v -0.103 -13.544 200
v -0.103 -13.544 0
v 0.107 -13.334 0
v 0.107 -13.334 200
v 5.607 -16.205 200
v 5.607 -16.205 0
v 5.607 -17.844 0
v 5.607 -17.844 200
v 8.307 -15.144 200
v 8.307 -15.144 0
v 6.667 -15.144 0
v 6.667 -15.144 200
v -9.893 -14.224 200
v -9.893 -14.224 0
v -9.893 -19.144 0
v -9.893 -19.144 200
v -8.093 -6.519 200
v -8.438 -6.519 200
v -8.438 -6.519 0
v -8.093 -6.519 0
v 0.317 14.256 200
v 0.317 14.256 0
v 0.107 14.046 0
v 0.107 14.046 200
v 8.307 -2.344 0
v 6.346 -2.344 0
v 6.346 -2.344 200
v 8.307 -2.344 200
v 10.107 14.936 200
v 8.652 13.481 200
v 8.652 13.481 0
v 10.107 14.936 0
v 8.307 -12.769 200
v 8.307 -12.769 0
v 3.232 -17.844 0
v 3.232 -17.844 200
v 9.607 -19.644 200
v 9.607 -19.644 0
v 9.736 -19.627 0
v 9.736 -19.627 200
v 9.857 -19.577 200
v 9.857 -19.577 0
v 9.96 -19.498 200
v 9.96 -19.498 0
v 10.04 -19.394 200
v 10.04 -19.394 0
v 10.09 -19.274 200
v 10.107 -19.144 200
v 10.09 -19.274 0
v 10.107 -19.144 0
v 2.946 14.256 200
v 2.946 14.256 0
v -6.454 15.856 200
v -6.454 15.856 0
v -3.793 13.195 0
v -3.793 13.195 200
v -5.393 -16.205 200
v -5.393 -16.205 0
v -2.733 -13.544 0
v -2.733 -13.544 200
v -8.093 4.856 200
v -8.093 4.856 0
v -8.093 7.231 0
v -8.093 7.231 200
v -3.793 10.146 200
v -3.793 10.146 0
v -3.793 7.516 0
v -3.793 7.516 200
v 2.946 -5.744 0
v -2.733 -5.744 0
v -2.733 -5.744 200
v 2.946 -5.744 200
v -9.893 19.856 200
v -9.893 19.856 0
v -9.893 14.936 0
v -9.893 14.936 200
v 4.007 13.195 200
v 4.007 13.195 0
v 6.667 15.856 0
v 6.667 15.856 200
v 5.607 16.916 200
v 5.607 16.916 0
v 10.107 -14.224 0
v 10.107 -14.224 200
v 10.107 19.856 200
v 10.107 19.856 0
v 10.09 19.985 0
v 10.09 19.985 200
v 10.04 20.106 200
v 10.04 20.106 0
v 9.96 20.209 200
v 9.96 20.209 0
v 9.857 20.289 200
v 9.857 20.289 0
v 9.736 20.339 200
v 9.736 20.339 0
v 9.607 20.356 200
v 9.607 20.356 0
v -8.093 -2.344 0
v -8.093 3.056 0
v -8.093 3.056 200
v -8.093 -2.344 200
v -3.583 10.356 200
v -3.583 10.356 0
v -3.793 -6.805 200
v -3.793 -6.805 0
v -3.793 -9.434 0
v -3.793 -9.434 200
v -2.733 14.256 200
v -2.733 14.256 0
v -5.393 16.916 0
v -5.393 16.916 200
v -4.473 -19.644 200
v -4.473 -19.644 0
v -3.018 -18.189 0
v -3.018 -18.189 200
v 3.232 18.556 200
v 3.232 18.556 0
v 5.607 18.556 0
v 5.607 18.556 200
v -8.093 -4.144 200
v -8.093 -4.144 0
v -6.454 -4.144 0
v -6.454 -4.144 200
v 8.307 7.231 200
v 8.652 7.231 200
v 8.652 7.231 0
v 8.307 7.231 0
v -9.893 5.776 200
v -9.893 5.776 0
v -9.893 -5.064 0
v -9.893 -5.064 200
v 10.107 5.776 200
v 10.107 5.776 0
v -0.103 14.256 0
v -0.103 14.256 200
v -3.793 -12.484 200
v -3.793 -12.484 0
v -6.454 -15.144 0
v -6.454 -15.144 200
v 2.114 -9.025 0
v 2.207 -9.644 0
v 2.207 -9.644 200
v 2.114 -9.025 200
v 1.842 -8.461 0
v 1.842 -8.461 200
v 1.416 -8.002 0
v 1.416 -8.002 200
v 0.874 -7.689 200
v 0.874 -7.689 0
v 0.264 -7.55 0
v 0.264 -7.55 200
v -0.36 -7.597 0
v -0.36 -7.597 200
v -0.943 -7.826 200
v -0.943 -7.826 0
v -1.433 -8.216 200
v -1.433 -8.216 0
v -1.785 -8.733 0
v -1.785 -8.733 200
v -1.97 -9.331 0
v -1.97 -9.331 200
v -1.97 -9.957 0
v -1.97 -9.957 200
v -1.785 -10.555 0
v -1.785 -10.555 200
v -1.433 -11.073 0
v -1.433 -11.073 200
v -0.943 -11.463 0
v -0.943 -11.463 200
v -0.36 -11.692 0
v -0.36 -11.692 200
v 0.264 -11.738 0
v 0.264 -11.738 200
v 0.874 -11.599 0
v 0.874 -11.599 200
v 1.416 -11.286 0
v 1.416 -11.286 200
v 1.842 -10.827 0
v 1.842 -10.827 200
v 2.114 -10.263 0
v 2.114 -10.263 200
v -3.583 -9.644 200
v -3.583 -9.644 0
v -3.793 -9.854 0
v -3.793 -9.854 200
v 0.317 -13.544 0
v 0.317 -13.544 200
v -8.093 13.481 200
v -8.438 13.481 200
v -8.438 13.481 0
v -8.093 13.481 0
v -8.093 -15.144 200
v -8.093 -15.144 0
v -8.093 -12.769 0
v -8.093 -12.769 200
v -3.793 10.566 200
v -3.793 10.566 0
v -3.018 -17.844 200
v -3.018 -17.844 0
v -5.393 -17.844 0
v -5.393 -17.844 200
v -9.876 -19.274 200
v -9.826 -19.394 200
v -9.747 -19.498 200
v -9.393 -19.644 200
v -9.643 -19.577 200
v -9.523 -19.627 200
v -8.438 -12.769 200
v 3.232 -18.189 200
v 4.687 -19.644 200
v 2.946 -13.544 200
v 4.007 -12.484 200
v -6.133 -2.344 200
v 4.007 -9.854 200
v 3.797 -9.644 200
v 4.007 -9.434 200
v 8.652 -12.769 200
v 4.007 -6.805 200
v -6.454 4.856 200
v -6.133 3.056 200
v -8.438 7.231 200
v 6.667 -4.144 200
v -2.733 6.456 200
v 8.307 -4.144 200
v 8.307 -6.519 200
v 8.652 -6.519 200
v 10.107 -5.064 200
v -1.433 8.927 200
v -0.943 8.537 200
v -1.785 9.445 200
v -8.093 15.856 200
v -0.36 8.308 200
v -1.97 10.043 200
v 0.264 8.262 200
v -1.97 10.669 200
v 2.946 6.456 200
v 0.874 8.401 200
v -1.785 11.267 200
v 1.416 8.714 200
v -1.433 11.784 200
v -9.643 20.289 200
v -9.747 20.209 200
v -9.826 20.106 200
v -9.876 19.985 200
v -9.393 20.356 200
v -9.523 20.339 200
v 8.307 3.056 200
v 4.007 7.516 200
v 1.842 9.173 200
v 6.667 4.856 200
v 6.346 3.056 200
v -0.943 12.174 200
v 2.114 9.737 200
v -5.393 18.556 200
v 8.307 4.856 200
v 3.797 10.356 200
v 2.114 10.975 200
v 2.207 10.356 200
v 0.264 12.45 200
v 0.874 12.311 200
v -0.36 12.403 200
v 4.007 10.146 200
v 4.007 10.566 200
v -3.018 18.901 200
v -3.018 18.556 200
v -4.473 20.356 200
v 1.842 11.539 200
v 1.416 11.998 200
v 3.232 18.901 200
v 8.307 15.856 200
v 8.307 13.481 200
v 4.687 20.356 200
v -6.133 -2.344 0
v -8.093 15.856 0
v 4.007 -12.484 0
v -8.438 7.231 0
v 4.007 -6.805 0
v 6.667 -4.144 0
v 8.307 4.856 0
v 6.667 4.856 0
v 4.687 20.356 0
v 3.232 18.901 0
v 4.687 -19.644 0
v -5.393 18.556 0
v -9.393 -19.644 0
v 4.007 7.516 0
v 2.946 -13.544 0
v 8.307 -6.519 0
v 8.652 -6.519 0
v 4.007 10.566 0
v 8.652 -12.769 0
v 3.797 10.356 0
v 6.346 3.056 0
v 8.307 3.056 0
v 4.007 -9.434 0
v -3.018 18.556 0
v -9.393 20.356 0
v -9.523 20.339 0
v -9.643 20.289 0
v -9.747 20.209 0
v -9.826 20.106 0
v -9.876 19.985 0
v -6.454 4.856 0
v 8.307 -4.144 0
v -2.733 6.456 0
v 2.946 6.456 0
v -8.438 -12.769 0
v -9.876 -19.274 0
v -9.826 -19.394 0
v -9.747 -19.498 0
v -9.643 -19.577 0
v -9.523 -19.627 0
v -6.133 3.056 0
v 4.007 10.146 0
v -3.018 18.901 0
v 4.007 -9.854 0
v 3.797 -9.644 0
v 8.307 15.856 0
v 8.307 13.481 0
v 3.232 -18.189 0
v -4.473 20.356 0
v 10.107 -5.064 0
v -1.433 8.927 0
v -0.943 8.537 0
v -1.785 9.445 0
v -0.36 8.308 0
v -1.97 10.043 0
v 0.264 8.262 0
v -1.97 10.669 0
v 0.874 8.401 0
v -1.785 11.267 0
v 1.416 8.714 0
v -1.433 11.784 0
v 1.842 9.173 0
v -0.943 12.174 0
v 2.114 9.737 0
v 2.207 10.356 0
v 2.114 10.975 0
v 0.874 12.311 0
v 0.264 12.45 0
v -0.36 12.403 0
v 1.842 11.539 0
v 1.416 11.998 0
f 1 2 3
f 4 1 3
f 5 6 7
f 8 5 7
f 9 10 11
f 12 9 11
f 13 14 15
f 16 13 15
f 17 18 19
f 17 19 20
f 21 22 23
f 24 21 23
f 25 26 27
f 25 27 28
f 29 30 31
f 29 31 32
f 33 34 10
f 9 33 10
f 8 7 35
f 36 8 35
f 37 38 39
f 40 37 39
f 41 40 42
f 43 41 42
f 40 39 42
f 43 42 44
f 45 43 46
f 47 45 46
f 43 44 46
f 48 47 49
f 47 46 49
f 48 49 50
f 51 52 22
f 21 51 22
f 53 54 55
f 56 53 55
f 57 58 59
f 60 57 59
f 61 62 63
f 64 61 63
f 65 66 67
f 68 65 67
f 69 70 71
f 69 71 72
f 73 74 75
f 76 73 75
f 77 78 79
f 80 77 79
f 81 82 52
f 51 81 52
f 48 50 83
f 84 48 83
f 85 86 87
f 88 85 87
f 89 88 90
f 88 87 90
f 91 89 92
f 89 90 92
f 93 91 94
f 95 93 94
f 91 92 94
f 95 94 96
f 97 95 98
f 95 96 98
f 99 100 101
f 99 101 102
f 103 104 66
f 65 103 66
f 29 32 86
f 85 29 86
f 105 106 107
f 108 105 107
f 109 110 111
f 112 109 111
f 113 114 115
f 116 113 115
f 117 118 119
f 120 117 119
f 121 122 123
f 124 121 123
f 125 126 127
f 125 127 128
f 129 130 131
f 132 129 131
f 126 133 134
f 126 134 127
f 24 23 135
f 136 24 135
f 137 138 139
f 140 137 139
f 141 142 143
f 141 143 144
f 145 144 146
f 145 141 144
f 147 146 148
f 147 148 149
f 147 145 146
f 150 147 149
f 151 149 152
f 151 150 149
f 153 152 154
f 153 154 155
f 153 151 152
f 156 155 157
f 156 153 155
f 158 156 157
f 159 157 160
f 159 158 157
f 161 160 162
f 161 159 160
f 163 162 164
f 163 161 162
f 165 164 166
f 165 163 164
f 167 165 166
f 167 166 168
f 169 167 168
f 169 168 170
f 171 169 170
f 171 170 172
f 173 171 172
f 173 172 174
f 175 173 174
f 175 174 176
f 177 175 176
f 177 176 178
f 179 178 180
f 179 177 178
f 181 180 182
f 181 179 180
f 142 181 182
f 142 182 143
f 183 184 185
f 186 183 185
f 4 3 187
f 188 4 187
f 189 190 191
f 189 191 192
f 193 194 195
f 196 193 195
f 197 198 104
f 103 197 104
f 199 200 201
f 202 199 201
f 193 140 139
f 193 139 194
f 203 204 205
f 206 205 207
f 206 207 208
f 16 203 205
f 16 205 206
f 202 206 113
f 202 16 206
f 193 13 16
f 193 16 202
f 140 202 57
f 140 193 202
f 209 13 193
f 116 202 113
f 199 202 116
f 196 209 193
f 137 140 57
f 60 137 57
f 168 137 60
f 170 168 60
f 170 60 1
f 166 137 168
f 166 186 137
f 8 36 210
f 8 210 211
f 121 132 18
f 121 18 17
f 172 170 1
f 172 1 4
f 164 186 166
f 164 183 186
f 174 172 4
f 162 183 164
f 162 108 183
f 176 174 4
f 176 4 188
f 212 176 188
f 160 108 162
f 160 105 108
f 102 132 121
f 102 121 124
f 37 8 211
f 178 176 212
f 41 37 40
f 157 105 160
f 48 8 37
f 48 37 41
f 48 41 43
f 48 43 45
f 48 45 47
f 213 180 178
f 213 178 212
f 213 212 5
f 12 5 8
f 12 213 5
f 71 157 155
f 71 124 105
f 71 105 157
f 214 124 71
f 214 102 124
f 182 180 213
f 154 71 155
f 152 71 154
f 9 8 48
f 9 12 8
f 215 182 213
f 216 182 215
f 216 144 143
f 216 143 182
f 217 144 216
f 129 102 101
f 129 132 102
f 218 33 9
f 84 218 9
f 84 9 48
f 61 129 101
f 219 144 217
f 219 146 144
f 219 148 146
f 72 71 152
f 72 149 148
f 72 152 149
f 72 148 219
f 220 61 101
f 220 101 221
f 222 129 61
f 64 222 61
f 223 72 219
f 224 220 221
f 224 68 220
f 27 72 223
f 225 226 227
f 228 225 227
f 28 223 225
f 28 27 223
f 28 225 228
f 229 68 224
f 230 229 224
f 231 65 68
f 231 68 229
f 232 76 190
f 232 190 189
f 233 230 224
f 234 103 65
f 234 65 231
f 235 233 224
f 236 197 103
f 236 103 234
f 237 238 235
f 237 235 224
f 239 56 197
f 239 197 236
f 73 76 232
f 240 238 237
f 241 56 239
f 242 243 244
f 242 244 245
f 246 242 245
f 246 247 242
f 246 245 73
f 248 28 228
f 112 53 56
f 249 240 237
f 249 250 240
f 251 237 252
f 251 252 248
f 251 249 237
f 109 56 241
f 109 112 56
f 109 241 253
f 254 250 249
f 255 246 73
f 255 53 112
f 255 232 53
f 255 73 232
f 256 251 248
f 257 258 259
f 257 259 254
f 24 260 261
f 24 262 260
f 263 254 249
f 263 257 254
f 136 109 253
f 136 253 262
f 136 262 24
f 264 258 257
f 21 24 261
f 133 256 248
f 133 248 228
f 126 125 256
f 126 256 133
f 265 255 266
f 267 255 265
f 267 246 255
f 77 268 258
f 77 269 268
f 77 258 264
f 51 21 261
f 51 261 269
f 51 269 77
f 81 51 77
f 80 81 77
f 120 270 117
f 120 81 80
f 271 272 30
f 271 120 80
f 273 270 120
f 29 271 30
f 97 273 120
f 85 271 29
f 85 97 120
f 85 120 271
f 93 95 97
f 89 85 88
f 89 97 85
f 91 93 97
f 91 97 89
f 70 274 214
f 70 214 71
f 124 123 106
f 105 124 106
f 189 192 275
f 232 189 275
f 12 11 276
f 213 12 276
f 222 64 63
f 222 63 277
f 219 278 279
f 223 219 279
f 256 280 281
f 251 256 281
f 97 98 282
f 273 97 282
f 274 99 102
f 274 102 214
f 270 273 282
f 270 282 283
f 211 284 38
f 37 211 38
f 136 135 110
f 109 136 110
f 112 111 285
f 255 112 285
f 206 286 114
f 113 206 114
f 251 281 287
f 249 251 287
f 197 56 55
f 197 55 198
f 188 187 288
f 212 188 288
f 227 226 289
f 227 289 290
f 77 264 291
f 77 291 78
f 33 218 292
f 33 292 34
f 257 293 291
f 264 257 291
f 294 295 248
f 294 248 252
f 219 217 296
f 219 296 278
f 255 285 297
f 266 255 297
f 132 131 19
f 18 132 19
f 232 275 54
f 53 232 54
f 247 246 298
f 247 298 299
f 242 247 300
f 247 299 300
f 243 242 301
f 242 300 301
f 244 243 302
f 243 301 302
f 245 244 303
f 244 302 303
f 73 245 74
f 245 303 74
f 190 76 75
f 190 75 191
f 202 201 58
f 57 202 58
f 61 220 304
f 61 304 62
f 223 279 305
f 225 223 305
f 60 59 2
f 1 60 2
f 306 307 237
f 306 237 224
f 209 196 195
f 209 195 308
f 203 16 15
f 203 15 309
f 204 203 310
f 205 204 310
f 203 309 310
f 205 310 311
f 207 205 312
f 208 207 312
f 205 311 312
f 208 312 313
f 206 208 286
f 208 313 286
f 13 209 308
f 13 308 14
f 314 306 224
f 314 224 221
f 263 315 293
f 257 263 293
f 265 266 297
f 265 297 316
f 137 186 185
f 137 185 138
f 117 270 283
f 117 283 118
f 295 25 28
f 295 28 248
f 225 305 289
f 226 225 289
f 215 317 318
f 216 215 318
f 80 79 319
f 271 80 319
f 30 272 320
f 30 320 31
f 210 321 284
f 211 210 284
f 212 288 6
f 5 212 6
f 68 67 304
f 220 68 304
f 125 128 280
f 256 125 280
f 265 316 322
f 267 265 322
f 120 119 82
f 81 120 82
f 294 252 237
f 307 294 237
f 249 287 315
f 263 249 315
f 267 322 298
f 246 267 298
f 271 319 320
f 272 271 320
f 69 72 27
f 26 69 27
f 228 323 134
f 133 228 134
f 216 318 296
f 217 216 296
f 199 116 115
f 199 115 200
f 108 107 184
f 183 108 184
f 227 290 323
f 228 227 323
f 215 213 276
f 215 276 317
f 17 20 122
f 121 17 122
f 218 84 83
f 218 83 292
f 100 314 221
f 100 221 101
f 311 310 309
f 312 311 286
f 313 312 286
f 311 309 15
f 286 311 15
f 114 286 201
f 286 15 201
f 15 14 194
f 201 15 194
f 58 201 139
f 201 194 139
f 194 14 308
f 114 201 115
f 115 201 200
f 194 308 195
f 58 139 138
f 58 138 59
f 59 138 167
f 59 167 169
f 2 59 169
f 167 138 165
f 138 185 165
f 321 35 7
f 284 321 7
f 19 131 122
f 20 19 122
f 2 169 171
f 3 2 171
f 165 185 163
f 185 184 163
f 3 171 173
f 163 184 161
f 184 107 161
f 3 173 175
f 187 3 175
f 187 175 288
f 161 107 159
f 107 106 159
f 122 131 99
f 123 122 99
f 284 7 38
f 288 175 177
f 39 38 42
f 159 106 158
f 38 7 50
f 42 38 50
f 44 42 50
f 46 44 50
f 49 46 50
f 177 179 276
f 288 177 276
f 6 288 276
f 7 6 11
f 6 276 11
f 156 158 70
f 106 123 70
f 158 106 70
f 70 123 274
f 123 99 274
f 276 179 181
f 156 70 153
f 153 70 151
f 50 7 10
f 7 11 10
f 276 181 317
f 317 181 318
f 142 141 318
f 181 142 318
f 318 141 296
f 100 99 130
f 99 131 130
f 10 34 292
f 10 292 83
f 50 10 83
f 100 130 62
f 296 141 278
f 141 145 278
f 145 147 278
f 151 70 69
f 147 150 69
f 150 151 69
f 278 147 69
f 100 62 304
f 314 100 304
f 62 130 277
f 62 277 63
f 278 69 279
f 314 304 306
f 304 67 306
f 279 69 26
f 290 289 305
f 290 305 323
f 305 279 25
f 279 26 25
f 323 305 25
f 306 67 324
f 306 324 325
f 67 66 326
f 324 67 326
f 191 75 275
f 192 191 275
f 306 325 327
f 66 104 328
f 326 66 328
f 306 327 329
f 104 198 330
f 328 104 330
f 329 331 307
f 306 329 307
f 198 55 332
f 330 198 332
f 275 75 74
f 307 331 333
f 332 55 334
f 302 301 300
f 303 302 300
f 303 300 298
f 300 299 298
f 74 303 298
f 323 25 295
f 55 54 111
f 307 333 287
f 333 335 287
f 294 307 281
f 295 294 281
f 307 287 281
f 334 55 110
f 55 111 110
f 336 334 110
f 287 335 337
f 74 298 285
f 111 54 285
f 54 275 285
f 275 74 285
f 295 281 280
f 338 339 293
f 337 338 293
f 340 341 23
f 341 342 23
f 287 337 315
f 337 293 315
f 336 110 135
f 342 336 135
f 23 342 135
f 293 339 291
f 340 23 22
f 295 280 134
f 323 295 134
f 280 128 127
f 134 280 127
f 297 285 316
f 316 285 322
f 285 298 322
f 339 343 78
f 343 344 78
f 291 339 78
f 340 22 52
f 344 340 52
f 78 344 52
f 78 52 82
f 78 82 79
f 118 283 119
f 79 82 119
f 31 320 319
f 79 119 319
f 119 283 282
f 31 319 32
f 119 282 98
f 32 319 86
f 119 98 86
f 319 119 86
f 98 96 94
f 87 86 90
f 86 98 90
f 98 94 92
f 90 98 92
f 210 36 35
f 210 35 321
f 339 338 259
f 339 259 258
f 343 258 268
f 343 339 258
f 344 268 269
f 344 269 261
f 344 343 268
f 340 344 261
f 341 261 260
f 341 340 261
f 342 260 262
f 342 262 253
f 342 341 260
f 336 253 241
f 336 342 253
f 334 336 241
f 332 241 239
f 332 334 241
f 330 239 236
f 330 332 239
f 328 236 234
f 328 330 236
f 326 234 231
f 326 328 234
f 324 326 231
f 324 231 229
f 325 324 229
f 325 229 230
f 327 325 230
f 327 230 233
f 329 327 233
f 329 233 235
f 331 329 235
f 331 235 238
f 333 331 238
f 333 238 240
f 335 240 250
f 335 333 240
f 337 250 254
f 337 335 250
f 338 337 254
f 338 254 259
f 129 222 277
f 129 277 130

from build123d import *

# Parameters (mm, degrees)
SKETCH2_R           = 2.1
BOSS_EXTRUDE1_DEPTH = 200


with BuildPart() as part:
    # Sketch2 → Boss-Extrude1 (new body)
    with BuildSketch(Plane.XY):
        with BuildLine():
            Line((4.006804208, 10.145798499), (3.796804208, 10.355798499))
            Line((3.796804208, 10.355798499), (4.006804208, 10.565798499))
            Line((4.006804208, 10.565798499), (4.006804208, 13.195138327))
            Line((4.006804208, 13.195138327), (6.66746438, 15.855798499))
            Line((6.66746438, 15.855798499), (8.306804208, 15.855798499))
            Line((8.306804208, 15.855798499), (8.306804208, 13.480798499))
            Line((8.306804208, 13.480798499), (8.651804208, 13.480798499))
            Line((8.651804208, 13.480798499), (10.106804208, 14.935798499))
            Line((10.106804208, 14.935798499), (10.106804208, 19.855798499))
            ThreePointArc((10.106804208, 19.855798499), (9.960357598, 20.209351889), (9.606804208, 20.355798499))
            Line((9.606804208, 20.355798499), (4.686804208, 20.355798499))
            Line((4.686804208, 20.355798499), (3.231804208, 18.900798499))
            Line((3.231804208, 18.900798499), (3.231804208, 18.555798499))
            Line((3.231804208, 18.555798499), (5.606804208, 18.555798499))
            Line((5.606804208, 18.555798499), (5.606804208, 16.91645867))
            Line((5.606804208, 16.91645867), (2.946144036, 14.255798499))
            Line((2.946144036, 14.255798499), (0.316804208, 14.255798499))
            Line((0.316804208, 14.255798499), (0.106804208, 14.045798499))
            Line((0.106804208, 14.045798499), (-0.103195792, 14.255798499))
            Line((-0.103195792, 14.255798499), (-2.73253562, 14.255798499))
            Line((-2.73253562, 14.255798499), (-5.393195792, 16.91645867))
            Line((-5.393195792, 16.91645867), (-5.393195792, 18.555798499))
            Line((-5.393195792, 18.555798499), (-3.018195792, 18.555798499))
            Line((-3.018195792, 18.555798499), (-3.018195792, 18.900798499))
            Line((-3.018195792, 18.900798499), (-4.473195792, 20.355798499))
            Line((-4.473195792, 20.355798499), (-9.393195792, 20.355798499))
            ThreePointArc((-9.393195792, 20.355798499), (-9.746749183, 20.209351889), (-9.893195792, 19.855798499))
            Line((-9.893195792, 19.855798499), (-9.893195792, 14.935798499))
            Line((-9.893195792, 14.935798499), (-8.438195792, 13.480798499))
            Line((-8.438195792, 13.480798499), (-8.093195792, 13.480798499))
            Line((-8.093195792, 13.480798499), (-8.093195792, 15.855798499))
            Line((-8.093195792, 15.855798499), (-6.453855964, 15.855798499))
            Line((-6.453855964, 15.855798499), (-3.793195792, 13.195138327))
            Line((-3.793195792, 13.195138327), (-3.793195792, 10.565798499))
            Line((-3.793195792, 10.565798499), (-3.583195792, 10.355798499))
            Line((-3.583195792, 10.355798499), (-3.793195792, 10.145798499))
            Line((-3.793195792, 10.145798499), (-3.793195792, 7.51645867))
            Line((-3.793195792, 7.51645867), (-6.453855964, 4.855798499))
            Line((-6.453855964, 4.855798499), (-8.093195792, 4.855798499))
            Line((-8.093195792, 4.855798499), (-8.093195792, 7.230798499))
            Line((-8.093195792, 7.230798499), (-8.438195792, 7.230798499))
            Line((-8.438195792, 7.230798499), (-9.893195792, 5.775798499))
            Line((-9.893195792, 5.775798499), (-9.893195792, -5.064201501))
            Line((-9.893195792, -5.064201501), (-8.438195792, -6.519201501))
            Line((-8.438195792, -6.519201501), (-8.093195792, -6.519201501))
            Line((-8.093195792, -6.519201501), (-8.093195792, -4.144201501))
            Line((-8.093195792, -4.144201501), (-6.453855964, -4.144201501))
            Line((-6.453855964, -4.144201501), (-3.793195792, -6.804861673))
            Line((-3.793195792, -6.804861673), (-3.793195792, -9.434201501))
            Line((-3.793195792, -9.434201501), (-3.583195792, -9.644201501))
            Line((-3.583195792, -9.644201501), (-3.793195792, -9.854201501))
            Line((-3.793195792, -9.854201501), (-3.793195792, -12.48354133))
            Line((-3.793195792, -12.48354133), (-6.453855964, -15.144201501))
            Line((-6.453855964, -15.144201501), (-8.093195792, -15.144201501))
            Line((-8.093195792, -15.144201501), (-8.093195792, -12.769201501))
            Line((-8.093195792, -12.769201501), (-8.438195792, -12.769201501))
            Line((-8.438195792, -12.769201501), (-9.893195792, -14.224201501))
            Line((-9.893195792, -14.224201501), (-9.893195792, -19.144201501))
            ThreePointArc((-9.893195792, -19.144201501), (-9.746749183, -19.497754892), (-9.393195792, -19.644201501))
            Line((-9.393195792, -19.644201501), (-4.473195792, -19.644201501))
            Line((-4.473195792, -19.644201501), (-3.018195792, -18.189201501))
            Line((-3.018195792, -18.189201501), (-3.018195792, -17.844201501))
            Line((-3.018195792, -17.844201501), (-5.393195792, -17.844201501))
            Line((-5.393195792, -17.844201501), (-5.393195792, -16.204861673))
            Line((-5.393195792, -16.204861673), (-2.73253562, -13.544201501))
            Line((-2.73253562, -13.544201501), (-0.103195792, -13.544201501))
            Line((-0.103195792, -13.544201501), (0.106804208, -13.334201501))
            Line((0.106804208, -13.334201501), (0.316804208, -13.544201501))
            Line((0.316804208, -13.544201501), (2.946144036, -13.544201501))
            Line((2.946144036, -13.544201501), (5.606804208, -16.204861673))
            Line((5.606804208, -16.204861673), (5.606804208, -17.844201501))
            Line((5.606804208, -17.844201501), (3.231804208, -17.844201501))
            Line((3.231804208, -17.844201501), (3.231804208, -18.189201501))
            Line((3.231804208, -18.189201501), (4.686804208, -19.644201501))
            Line((4.686804208, -19.644201501), (9.606804208, -19.644201501))
            ThreePointArc((9.606804208, -19.644201501), (9.960357598, -19.497754892), (10.106804208, -19.144201501))
            Line((10.106804208, -19.144201501), (10.106804208, -14.224201501))
            Line((10.106804208, -14.224201501), (8.651804208, -12.769201501))
            Line((8.651804208, -12.769201501), (8.306804208, -12.769201501))
            Line((8.306804208, -12.769201501), (8.306804208, -15.144201501))
            Line((8.306804208, -15.144201501), (6.66746438, -15.144201501))
            Line((6.66746438, -15.144201501), (4.006804208, -12.48354133))
            Line((4.006804208, -12.48354133), (4.006804208, -9.854201501))
            Line((4.006804208, -9.854201501), (3.796804208, -9.644201501))
            Line((3.796804208, -9.644201501), (4.006804208, -9.434201501))
            Line((4.006804208, -9.434201501), (4.006804208, -6.804861673))
            Line((4.006804208, -6.804861673), (6.66746438, -4.144201501))
            Line((6.66746438, -4.144201501), (8.306804208, -4.144201501))
            Line((8.306804208, -4.144201501), (8.306804208, -6.519201501))
            Line((8.306804208, -6.519201501), (8.651804208, -6.519201501))
            Line((8.651804208, -6.519201501), (10.106804208, -5.064201501))
            Line((10.106804208, -5.064201501), (10.106804208, 5.775798499))
            Line((10.106804208, 5.775798499), (8.651804208, 7.230798499))
            Line((8.651804208, 7.230798499), (8.306804208, 7.230798499))
            Line((8.306804208, 7.230798499), (8.306804208, 4.855798499))
            Line((8.306804208, 4.855798499), (6.66746438, 4.855798499))
            Line((6.66746438, 4.855798499), (4.006804208, 7.51645867))
            Line((4.006804208, 7.51645867), (4.006804208, 10.145798499))
        make_face()
        with Locations((0.106804208, -9.644201501)):
            Circle(SKETCH2_R, mode=Mode.SUBTRACT)
        with Locations((0.106804208, 10.355798499)):
            Circle(SKETCH2_R, mode=Mode.SUBTRACT)
        Polygon((-6.13253562, -2.344201501), (-2.73253562, -5.744201501), (2.946144036, -5.744201501), (6.346144036, -2.344201501), (8.306804208, -2.344201501), (8.306804208, 3.055798499), (6.346144036, 3.055798499), (2.946144036, 6.455798499), (-2.73253562, 6.455798499), (-6.13253562, 3.055798499), (-8.093195792, 3.055798499), (-8.093195792, -2.344201501), align=None, mode=Mode.SUBTRACT)
    extrude(amount=BOSS_EXTRUDE1_DEPTH)


solid = part.part
